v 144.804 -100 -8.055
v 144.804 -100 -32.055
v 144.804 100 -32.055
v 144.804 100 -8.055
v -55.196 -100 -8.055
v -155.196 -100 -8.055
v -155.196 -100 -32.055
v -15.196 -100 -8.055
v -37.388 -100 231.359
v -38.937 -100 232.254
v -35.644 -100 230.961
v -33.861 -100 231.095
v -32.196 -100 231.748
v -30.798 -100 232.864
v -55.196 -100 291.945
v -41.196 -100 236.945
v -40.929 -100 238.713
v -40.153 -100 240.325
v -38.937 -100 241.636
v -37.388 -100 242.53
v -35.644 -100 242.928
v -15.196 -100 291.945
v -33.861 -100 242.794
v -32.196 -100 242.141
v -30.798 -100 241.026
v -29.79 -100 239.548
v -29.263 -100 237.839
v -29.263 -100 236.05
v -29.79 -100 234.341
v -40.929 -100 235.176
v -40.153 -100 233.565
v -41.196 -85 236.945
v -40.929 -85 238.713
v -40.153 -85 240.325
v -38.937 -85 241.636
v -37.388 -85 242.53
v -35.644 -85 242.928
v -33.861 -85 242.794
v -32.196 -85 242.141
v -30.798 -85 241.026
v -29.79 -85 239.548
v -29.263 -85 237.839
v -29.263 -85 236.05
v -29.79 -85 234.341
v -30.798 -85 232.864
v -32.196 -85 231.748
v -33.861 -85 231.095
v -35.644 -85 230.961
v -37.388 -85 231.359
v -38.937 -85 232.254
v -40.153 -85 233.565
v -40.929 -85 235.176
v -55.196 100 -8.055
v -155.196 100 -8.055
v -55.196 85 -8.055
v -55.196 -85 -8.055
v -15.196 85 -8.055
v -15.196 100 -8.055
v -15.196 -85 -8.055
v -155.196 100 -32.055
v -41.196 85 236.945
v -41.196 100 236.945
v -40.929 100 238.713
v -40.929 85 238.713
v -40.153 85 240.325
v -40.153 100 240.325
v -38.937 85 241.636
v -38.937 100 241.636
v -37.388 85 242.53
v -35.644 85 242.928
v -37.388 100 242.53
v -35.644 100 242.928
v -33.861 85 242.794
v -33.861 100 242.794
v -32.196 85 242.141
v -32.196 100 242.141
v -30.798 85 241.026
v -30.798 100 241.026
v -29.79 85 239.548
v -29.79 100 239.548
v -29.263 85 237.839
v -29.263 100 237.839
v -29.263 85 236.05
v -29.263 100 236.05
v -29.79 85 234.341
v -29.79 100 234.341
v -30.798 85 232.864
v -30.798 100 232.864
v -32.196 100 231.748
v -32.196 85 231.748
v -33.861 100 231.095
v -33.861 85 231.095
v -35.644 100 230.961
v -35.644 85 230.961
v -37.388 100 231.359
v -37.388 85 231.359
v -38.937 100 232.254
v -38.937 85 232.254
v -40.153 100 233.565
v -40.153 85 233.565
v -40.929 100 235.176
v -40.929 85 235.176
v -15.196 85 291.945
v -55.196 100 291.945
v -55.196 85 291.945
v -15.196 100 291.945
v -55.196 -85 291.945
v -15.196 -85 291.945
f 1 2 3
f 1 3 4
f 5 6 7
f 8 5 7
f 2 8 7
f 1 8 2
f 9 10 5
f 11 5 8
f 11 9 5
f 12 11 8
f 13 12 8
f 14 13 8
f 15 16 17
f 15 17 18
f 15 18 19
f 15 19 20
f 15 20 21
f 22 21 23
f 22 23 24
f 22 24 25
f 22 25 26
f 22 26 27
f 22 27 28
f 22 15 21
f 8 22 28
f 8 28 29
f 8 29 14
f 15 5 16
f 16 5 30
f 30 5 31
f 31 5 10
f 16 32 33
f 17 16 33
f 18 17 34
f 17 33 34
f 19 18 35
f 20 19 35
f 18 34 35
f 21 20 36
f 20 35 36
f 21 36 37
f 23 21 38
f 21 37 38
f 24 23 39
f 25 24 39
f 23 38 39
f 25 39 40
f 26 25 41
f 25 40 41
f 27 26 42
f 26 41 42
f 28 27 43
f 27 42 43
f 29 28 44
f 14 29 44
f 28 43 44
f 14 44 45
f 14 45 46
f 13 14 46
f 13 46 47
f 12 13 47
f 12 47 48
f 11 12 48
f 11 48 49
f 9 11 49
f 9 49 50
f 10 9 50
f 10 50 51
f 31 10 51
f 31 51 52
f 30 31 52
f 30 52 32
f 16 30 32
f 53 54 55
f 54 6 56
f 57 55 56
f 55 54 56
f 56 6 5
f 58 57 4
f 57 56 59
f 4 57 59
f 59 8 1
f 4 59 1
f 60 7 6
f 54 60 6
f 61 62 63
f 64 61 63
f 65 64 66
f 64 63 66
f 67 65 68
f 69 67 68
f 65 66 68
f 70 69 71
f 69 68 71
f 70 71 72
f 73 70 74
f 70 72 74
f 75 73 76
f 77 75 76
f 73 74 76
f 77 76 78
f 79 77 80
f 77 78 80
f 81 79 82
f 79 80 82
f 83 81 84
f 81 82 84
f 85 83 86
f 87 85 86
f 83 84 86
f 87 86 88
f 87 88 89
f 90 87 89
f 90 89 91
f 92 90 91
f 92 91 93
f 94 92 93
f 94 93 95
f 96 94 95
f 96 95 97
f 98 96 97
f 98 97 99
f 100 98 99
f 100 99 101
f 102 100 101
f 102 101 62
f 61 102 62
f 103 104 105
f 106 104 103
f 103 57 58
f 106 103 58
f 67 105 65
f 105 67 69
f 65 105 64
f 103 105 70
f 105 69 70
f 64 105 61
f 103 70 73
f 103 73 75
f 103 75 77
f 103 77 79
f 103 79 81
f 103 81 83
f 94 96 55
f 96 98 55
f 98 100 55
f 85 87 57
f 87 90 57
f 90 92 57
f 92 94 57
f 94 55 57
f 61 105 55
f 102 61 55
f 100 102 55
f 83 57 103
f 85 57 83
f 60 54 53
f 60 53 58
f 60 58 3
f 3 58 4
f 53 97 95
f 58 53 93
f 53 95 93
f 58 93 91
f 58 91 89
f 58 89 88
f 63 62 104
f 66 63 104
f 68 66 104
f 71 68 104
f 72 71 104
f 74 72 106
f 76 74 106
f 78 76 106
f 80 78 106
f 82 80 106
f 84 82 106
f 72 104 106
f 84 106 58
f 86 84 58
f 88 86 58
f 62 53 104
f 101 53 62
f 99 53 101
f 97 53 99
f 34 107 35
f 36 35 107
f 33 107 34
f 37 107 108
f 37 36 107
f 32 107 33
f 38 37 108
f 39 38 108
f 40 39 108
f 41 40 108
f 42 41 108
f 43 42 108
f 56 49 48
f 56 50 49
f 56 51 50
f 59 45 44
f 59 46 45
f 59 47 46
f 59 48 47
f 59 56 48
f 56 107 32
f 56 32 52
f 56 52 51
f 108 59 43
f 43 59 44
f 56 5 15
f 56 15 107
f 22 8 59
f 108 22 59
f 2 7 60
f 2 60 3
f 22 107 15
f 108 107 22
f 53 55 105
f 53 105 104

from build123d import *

# Parameters (mm, degrees)
F0_W     = 300
F0_H     = 24
F1_DEPTH = 100
F2_W     = 40
F2_H     = 15
F3_DEPTH = 300
F5_D     = 12


with BuildPart() as f1:
    # F0 (on Front) → F1 (new body, symmetric)
    with BuildSketch(Plane.XZ):
        with Locations((-5.195878, -20.055381)):
            Rectangle(F0_W, F0_H)
    extrude(amount=F1_DEPTH, both=True)

    # F2 (on face) → F3 (join)
    with BuildSketch(Plane.XY.offset(-8.055381)):
        with Locations((-35.195878, -92.5)):
            Rectangle(F2_W, F2_H)
        with Locations((-35.195878, 92.5)):
            Rectangle(F2_W, F2_H)
    extrude(amount=F3_DEPTH)

    # F5 (through all)
    with Locations(Plane.XZ.offset(100)):
        with Locations((-35.195878, 236.944619)):
            Hole(F5_D / 2)


solid = f1.part
